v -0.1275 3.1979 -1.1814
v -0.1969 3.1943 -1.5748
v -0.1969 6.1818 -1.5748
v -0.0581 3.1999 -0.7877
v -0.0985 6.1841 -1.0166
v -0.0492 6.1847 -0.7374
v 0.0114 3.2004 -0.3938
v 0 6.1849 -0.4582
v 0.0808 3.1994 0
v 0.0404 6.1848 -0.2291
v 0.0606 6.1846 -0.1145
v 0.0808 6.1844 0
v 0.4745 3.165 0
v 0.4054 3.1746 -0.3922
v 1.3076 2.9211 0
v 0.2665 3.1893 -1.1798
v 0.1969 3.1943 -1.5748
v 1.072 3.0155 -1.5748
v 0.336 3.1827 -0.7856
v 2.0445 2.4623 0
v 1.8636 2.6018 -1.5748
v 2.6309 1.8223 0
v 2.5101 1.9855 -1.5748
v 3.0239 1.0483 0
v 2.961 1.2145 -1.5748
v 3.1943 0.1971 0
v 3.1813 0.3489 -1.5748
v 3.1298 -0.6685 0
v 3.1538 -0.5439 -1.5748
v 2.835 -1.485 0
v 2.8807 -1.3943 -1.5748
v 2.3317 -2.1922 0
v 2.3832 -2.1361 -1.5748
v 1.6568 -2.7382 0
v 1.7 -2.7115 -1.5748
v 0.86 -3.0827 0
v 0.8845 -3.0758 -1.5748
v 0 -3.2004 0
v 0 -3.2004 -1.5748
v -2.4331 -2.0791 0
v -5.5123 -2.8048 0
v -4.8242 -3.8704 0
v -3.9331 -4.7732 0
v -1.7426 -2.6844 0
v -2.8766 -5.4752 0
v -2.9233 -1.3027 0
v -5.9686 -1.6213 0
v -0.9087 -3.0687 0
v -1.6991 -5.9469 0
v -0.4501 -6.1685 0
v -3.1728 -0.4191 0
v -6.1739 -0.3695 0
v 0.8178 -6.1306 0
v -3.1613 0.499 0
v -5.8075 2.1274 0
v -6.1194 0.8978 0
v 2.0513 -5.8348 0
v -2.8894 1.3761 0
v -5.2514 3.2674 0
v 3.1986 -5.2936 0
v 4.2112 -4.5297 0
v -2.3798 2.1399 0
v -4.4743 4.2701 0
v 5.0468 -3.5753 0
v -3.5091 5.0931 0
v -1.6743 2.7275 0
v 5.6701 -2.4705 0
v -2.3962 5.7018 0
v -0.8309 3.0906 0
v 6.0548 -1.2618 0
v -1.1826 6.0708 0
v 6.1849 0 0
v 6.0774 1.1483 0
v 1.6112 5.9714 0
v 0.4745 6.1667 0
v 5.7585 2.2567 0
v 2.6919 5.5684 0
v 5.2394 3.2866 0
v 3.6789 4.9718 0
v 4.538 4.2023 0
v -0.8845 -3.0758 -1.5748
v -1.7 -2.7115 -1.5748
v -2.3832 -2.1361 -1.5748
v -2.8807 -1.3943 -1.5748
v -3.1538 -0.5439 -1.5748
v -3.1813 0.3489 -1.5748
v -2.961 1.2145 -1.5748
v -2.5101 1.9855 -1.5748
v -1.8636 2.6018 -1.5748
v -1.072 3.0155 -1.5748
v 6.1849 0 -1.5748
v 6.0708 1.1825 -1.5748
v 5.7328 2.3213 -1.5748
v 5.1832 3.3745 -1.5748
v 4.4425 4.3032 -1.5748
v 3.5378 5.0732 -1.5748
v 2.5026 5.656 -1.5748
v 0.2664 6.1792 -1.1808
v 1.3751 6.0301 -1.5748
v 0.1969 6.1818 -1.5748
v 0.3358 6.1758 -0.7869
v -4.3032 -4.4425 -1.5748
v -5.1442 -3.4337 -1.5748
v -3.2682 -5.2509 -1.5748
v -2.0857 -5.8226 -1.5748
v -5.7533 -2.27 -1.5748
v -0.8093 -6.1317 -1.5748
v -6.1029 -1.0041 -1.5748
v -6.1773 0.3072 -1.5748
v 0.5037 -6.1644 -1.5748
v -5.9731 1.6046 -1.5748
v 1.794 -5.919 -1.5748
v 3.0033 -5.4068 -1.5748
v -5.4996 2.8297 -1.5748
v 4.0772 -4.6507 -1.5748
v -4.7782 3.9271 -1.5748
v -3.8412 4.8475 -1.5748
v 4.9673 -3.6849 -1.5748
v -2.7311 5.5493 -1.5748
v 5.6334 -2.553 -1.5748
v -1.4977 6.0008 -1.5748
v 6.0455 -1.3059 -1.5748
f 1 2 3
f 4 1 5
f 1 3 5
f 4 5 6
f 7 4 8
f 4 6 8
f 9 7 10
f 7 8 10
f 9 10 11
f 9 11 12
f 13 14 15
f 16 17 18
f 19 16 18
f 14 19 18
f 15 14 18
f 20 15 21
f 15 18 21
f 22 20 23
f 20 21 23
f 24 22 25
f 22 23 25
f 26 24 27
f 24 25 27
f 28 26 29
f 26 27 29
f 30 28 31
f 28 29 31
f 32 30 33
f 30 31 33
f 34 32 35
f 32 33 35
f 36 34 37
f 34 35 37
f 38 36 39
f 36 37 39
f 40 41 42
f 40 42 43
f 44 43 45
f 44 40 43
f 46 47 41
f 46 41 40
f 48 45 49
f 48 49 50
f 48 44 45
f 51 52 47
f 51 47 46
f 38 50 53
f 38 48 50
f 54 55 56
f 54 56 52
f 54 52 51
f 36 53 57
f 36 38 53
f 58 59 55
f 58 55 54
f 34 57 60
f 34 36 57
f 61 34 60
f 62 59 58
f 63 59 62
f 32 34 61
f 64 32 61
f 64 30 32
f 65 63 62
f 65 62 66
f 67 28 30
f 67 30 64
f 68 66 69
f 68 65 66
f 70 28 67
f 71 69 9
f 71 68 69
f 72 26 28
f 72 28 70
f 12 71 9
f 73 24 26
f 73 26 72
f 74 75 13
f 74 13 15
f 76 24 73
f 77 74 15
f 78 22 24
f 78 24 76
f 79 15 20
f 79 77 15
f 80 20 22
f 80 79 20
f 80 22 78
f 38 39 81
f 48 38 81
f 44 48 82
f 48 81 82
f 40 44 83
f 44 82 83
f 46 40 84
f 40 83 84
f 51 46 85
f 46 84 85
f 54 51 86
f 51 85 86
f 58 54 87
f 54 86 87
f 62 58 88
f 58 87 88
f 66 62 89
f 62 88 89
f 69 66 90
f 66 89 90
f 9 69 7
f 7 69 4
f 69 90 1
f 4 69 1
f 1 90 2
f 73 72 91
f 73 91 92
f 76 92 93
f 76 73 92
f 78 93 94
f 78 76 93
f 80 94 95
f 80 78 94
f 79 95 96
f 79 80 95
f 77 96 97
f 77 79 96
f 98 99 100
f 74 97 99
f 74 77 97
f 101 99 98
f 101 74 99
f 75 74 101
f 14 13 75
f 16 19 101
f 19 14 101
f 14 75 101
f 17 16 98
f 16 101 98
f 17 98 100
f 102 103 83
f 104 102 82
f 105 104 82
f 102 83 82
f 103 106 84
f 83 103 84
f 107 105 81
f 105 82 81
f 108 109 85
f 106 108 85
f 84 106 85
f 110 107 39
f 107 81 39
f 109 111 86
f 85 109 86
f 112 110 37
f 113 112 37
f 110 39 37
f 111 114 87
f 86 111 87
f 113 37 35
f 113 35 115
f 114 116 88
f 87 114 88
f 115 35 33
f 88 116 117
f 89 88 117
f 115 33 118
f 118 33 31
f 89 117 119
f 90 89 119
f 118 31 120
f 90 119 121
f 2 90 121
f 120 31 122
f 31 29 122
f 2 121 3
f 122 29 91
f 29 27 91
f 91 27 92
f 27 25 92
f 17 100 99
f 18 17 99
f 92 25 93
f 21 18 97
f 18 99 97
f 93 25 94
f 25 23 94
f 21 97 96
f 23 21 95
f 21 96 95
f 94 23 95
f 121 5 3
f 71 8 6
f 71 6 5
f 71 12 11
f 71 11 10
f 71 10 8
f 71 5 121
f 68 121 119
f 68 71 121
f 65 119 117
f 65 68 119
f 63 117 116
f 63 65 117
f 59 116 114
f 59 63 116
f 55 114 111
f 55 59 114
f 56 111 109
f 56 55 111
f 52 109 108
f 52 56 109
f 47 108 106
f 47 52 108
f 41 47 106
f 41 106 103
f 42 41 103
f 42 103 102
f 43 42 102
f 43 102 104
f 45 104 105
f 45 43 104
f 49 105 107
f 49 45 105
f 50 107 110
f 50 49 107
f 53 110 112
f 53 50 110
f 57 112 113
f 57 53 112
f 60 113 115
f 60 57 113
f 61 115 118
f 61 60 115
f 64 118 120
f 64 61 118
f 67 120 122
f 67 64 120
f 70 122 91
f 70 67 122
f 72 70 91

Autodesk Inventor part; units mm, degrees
ref_plane "WorkPlane1" through (0, 0, 0) normal (0, 0, 1) x (1, 0, 0)
ref_plane "WorkPlane3" through (0, 0, -1.5748) normal (0, 0, 1) x (1, 0, 0)
ref_plane "Work Plane3" through (0, -6.1849, 0) normal (0, 1, 0) x (-1, 0, 0)
ref_plane "WorkPlane10" through (0, 6.1849, 0) normal (0, 1, 0) x (-1, 0, 0)
sketch "Sketch1" plane through (0, 0, 0) normal (0, 0, 1) x (1, 0, 0)
  point P0 (0, 0)
sketch "Sketch2" plane through (0, 0, 0) normal (0, 0, 1) x (1, 0, 0)
  circle A0 centre (0, 0) radius 6.1849
  dimension "d3" = 12.3698
extrude "Extrusion1" add sketch "Sketch2" against normal blind 1.5748
sketch "Sketch4" plane through (0, 0, 0) normal (0, 0, 1) x (1, 0, 0)
  circle A0 centre (0, 0) radius 6.1849 projected
hole "Hole1" at (0, 0, 0) direction (0, 0, -1) diameter 6.4008 end through all
sketch "Sketch5" plane through (0, 6.1849, 0) normal (0, 1, 0) x (-1, 0, 0)
  line L0 (-0.0808, 0) -> (-0.4745, 0)
  line L1 (0.1969, -1.5748) -> (-0.0808, 0)
  line L2 (-0.1969, -1.5748) -> (0.1969, -1.5748)
  line L3 (-0.4745, 0) -> (-0.1969, -1.5748)
  line L4 (-3.2004, 0) -> (3.2004, 0) construction
  line L5 (6.1849, -1.5748) -> (-6.1849, -1.5748) construction
  line L6 (0, -3.048) -> (0, 0.508) projected
  dimension "d15" = 80
  dimension "d18" = 0.1968
  dimension "d19" = 0.1968
extrude "Extrusion2" cut sketch "Sketch5" against normal blind 6.1849
ref_plane "MSC_PT1" through (0, 0, 0) normal (0, 0, 1) x (1, 0, 0)
ref_plane "MSC_PT2" through (0, 0, -1.5748) normal (0, 0, -1) x (-1, 0, 0)
equation "\"d7\" = Diam1"
equation "\"d4\" = ParH"
equation "\"d18\" = 0.125 * ParH"
equation "\"d19\" = 0.125 * ParH"
equation "\"d16\" = 0.5 * Diam2"
equation "\"d3\" = Diam2"
equation "\"Diam2\" = 12.3698"
equation "\"ParH\" = 1.5748"
equation "\"Diam1\" = 6.4008"
equation "\"d20\" = 0.5 * Diam2"
properties part number "ANSI B18.21.1 - 0.25" material "Steel, Mild"
